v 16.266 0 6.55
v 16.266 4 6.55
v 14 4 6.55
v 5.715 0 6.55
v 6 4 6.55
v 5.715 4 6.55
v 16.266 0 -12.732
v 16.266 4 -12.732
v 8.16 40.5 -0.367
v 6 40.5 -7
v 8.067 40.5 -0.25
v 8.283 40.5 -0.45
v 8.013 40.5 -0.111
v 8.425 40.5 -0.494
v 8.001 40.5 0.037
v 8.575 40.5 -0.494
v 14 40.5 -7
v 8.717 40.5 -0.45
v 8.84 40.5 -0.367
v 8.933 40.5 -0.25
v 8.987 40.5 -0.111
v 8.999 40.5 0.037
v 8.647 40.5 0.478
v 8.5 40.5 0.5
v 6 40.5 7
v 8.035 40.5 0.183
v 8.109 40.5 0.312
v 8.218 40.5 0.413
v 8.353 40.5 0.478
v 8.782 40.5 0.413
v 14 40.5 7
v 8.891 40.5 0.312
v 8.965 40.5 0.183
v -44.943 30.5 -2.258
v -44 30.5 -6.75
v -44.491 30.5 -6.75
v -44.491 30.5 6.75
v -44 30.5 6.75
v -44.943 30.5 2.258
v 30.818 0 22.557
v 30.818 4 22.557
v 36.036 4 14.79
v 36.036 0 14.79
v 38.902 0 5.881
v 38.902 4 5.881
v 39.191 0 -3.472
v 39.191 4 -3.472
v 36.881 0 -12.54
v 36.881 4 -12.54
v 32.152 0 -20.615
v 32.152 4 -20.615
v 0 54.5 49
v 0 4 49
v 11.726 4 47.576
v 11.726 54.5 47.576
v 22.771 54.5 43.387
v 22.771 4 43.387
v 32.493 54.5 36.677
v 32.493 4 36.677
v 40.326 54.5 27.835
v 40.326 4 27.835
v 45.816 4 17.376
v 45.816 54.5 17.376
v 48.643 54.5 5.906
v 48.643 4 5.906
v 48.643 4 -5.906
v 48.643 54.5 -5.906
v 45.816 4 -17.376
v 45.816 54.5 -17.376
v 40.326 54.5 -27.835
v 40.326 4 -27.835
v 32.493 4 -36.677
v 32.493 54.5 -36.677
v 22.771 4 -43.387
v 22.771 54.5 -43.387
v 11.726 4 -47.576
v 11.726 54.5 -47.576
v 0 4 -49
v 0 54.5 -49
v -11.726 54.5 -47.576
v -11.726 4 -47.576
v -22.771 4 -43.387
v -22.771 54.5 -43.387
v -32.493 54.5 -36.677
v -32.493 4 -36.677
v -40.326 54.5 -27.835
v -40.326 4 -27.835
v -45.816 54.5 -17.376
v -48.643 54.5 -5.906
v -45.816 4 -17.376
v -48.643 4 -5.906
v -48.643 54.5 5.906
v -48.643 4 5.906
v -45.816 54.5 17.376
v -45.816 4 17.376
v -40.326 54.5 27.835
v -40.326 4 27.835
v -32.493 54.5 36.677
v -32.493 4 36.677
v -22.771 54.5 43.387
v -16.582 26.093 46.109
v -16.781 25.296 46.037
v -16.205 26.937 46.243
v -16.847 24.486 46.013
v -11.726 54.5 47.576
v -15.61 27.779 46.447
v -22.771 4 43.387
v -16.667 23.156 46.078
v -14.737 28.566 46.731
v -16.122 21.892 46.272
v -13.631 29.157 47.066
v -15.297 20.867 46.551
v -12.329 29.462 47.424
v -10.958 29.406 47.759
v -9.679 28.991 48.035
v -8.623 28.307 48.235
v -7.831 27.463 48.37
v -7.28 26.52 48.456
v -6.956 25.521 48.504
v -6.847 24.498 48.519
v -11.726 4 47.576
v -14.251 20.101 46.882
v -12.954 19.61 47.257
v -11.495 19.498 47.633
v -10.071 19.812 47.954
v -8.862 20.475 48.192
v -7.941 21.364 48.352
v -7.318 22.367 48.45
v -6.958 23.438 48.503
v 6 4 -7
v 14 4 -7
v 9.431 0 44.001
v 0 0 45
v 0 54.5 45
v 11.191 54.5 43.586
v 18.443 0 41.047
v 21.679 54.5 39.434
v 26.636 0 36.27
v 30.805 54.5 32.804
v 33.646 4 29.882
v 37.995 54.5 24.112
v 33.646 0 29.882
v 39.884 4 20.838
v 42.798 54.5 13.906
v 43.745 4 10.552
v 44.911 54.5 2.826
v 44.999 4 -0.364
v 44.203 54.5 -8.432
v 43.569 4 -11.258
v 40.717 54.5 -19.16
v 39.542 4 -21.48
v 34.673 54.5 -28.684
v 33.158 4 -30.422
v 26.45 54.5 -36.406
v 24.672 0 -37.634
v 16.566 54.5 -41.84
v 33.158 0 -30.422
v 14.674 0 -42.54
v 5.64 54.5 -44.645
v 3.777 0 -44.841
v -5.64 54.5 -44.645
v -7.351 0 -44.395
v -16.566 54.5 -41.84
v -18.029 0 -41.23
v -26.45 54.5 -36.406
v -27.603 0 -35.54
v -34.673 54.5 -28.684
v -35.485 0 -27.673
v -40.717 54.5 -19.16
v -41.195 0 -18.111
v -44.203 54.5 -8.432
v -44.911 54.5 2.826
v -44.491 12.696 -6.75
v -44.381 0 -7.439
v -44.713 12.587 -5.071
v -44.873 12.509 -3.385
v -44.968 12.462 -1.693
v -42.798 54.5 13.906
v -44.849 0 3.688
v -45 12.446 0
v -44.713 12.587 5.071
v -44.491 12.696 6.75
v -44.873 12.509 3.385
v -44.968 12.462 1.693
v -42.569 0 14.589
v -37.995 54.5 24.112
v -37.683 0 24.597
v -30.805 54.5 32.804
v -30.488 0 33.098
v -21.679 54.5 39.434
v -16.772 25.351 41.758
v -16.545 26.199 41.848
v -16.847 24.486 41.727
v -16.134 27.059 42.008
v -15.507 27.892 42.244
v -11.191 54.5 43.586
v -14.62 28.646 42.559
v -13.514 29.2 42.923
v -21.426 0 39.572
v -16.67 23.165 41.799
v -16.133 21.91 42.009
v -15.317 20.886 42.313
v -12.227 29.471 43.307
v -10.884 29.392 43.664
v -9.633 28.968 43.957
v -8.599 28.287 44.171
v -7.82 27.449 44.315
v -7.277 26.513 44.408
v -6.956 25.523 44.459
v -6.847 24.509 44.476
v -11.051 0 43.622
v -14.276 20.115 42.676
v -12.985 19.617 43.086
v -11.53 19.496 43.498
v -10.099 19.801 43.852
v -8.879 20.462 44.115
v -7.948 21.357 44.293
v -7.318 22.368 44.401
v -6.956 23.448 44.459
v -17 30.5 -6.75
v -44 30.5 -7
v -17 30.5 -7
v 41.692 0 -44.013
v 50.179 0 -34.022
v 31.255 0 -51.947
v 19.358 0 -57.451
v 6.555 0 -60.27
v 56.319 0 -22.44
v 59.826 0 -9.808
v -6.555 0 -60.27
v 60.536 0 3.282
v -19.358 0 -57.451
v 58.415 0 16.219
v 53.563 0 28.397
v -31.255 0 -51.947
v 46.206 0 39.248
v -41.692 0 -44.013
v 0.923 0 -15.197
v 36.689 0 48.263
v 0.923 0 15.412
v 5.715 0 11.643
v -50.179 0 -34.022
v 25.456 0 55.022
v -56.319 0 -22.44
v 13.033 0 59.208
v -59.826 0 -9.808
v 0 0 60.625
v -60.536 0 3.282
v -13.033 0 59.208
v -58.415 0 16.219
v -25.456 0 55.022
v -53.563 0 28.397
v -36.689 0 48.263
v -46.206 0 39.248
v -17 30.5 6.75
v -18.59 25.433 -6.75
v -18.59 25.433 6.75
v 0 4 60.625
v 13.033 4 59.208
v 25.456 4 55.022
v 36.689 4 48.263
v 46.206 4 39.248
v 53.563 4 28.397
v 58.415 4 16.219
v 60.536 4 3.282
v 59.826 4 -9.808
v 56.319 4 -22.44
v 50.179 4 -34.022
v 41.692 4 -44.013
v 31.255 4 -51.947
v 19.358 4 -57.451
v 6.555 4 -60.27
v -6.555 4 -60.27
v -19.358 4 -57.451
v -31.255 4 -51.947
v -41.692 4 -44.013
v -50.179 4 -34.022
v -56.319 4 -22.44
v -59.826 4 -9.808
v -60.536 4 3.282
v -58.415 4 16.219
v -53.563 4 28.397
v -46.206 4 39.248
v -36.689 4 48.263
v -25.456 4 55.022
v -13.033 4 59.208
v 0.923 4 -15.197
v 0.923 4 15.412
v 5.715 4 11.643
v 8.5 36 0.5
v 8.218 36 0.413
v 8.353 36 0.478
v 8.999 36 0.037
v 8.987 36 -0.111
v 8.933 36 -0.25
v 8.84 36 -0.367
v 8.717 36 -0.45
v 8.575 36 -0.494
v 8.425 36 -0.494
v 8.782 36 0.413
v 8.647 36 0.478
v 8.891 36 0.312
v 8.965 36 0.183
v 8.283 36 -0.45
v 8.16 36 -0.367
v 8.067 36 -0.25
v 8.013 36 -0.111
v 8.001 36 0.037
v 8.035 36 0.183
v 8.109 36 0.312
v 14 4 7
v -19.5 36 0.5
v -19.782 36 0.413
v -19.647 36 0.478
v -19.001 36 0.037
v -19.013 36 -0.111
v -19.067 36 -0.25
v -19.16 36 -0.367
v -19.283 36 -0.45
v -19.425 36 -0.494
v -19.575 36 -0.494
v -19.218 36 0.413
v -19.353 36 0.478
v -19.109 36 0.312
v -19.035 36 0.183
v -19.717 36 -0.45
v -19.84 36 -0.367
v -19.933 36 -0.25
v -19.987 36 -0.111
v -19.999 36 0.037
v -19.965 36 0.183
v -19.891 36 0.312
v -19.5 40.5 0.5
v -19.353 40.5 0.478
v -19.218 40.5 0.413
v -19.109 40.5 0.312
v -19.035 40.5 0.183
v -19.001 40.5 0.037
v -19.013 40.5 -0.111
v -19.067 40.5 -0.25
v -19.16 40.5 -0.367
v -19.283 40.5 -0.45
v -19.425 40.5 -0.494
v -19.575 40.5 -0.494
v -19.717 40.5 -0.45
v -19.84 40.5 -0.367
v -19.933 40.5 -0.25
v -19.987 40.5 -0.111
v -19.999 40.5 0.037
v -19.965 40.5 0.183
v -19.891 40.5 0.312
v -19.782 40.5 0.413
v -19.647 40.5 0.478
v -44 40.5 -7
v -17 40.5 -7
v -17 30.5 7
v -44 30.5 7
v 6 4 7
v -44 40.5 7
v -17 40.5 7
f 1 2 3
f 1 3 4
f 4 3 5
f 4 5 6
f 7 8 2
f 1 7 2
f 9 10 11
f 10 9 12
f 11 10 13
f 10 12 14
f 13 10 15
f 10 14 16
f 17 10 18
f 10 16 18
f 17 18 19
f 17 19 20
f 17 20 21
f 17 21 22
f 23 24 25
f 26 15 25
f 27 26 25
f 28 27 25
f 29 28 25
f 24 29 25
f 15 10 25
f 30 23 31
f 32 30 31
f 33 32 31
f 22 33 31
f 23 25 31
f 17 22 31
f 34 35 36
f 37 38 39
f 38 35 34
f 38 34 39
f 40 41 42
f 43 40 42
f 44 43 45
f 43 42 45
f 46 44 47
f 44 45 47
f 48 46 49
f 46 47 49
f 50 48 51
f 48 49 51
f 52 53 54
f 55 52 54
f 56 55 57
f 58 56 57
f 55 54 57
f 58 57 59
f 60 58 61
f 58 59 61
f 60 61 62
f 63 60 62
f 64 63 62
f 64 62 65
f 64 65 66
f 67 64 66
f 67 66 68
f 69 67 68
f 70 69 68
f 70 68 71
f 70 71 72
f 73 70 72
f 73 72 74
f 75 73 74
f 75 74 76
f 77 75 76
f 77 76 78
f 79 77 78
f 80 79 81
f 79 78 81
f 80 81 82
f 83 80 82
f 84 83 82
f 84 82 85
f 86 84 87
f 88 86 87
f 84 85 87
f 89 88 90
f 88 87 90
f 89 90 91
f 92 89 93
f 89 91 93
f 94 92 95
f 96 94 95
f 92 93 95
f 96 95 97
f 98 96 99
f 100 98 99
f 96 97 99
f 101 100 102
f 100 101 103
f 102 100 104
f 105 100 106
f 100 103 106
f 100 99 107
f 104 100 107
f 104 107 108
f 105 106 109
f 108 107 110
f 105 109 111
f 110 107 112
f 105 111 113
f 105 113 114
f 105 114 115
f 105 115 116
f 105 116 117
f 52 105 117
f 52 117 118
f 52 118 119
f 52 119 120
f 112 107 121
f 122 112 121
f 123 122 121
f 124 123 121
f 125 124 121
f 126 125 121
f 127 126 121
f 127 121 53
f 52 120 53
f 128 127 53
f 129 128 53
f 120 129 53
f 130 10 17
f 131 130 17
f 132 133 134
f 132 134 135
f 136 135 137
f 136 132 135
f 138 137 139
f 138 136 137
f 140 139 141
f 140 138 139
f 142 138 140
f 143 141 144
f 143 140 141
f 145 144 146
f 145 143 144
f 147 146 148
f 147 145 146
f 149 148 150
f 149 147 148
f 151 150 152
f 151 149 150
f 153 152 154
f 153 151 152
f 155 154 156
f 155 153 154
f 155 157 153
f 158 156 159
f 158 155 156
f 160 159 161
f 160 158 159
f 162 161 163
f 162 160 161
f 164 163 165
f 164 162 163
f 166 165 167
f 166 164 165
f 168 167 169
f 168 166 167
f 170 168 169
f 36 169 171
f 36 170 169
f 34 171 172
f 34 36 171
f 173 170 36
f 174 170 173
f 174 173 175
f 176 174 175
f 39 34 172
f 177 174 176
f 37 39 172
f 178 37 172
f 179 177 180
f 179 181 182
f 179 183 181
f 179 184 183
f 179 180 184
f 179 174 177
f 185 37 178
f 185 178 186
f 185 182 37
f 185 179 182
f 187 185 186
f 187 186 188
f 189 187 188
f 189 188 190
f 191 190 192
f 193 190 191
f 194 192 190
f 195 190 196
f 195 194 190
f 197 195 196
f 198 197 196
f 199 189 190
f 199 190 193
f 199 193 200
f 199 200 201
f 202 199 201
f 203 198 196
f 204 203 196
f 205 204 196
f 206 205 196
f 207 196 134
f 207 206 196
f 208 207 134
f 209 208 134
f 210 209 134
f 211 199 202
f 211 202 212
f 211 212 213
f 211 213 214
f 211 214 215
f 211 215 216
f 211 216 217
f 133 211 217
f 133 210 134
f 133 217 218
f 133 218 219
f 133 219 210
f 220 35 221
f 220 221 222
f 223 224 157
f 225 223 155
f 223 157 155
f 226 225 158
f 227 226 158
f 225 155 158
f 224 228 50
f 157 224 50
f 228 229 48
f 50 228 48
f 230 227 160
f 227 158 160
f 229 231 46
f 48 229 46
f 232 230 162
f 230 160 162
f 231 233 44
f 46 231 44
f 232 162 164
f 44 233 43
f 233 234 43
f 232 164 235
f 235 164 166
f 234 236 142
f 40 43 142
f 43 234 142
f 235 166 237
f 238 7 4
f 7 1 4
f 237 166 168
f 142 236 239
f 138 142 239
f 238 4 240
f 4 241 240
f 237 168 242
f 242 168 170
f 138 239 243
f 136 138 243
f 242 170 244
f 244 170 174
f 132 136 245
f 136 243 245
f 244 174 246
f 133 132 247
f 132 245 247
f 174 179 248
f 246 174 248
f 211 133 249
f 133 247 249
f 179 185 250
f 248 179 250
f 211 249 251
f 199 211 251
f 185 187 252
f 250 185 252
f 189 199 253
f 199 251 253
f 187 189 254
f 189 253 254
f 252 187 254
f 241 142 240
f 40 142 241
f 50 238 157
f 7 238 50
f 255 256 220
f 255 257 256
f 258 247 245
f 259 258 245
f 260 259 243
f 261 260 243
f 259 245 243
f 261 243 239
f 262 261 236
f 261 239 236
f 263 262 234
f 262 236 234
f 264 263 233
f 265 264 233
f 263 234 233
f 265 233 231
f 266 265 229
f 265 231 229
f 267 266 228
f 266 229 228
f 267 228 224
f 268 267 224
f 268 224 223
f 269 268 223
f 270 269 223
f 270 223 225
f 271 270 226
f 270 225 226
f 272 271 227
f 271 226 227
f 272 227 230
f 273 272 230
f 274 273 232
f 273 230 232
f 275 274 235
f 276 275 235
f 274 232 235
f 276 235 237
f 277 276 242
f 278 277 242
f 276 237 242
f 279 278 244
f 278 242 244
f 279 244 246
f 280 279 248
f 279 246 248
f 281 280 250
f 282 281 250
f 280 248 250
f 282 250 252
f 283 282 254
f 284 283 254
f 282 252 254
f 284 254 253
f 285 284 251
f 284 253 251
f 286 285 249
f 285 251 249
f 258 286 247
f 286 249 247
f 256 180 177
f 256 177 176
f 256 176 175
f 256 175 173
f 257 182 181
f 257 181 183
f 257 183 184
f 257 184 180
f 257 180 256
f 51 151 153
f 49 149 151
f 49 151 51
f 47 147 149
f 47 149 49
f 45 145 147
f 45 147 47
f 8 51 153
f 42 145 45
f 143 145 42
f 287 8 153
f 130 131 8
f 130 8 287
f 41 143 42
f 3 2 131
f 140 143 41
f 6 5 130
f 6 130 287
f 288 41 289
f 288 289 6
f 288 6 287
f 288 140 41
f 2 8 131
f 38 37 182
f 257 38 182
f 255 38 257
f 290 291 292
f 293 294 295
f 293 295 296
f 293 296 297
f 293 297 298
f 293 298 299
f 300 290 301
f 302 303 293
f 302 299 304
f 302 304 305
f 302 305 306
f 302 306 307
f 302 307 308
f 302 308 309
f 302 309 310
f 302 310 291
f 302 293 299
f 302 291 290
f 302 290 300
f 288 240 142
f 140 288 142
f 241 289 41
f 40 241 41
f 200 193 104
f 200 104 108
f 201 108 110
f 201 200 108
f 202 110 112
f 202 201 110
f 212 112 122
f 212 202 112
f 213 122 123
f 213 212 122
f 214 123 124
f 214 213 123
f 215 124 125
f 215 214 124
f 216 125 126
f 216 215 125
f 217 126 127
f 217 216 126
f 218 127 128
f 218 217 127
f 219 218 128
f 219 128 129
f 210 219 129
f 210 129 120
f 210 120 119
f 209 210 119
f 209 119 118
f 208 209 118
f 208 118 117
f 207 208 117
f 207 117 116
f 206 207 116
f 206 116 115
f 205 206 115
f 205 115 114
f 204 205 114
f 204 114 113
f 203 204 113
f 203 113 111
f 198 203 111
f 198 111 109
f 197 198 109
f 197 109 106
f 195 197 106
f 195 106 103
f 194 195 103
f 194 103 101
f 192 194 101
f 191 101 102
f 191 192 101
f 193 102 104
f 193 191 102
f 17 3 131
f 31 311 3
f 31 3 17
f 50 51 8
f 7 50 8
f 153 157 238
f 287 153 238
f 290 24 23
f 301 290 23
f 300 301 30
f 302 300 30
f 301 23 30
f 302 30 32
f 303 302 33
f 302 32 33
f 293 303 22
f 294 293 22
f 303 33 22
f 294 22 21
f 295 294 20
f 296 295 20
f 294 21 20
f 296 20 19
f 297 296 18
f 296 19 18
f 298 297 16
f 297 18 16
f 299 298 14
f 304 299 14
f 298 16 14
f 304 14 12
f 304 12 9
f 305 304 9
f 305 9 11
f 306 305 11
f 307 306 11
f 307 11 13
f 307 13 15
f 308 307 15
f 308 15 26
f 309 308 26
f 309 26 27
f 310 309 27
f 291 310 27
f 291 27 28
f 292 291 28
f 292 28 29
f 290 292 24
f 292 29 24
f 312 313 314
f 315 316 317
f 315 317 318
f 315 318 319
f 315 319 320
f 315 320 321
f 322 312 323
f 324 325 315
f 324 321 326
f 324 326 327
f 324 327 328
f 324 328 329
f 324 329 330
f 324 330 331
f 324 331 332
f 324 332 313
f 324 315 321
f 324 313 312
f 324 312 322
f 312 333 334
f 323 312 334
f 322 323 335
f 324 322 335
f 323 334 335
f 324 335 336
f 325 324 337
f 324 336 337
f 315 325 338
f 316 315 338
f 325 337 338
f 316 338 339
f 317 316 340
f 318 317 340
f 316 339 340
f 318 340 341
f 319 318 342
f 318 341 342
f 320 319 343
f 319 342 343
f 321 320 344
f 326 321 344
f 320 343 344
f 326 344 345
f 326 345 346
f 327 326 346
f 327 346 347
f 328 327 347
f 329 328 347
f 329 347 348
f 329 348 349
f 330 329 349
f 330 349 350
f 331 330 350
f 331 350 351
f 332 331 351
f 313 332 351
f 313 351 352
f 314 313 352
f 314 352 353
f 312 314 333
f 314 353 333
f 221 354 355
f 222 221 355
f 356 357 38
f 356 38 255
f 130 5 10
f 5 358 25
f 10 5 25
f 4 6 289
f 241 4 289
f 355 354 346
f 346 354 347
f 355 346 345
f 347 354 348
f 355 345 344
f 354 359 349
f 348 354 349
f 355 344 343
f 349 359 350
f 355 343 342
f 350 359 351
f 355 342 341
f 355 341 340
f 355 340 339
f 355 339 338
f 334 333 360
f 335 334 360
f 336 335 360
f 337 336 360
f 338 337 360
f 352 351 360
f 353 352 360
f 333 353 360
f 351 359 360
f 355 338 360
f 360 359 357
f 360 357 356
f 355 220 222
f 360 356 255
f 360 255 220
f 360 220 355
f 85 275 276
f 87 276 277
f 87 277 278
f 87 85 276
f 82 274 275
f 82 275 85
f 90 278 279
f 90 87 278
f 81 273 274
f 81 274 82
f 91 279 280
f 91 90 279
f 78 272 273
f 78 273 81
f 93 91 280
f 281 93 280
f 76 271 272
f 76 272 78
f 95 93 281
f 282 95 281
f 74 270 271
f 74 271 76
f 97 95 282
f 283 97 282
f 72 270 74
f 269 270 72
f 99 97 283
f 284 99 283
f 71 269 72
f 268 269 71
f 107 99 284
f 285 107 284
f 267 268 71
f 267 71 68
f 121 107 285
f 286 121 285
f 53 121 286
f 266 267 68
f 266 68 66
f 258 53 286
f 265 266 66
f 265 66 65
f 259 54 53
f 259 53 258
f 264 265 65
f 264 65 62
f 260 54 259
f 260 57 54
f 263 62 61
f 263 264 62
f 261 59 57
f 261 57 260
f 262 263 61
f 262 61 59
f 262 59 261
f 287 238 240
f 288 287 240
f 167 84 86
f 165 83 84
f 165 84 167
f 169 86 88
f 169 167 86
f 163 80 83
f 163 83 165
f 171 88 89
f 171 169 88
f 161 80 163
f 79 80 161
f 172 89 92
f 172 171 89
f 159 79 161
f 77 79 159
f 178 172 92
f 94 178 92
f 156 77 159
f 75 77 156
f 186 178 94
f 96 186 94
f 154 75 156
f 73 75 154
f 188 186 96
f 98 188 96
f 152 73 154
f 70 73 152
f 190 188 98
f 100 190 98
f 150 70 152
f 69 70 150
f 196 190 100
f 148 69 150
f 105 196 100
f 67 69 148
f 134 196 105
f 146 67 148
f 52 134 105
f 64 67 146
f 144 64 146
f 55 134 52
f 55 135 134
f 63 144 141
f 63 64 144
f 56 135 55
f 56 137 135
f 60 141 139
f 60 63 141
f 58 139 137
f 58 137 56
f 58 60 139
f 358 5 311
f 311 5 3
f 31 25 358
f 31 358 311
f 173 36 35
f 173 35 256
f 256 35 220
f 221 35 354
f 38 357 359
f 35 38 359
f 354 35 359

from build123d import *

# Parameters (mm, degrees)
SKETCH1_R             = 60.625
SKETCH1_R_2           = 45
BOSS_EXTRUDE1_DEPTH   = 4
SKETCH2_R             = 49
SKETCH2_R_2           = 45
BOSS_EXTRUDE2_DEPTH   = 50.5
SKETCH4_W             = 8
SKETCH4_H             = 40.5
BOSS_EXTRUDE4_DEPTH   = 7
SKETCH4_W_2           = 27
SKETCH4_H_2           = 10
BOSS_EXTRUDE4_2_DEPTH = 7
BOSS_EXTRUDE5_DEPTH   = 4
SKETCH6_R             = 5
CUT_EXTRUDE2_DEPTH    = 52
CUT_EXTRUDE6_DEPTH    = 100.503925853
SKETCH15_R            = 0.5
CUT_EXTRUDE7_DEPTH    = 4.5
SKETCH15_3_R          = 0.5
CUT_EXTRUDE8_DEPTH    = 4.5
BOSS_EXTRUDE6_DEPTH   = 6.75


with BuildPart() as part:
    # Sketch1 → Boss-Extrude1 (new body)
    with BuildSketch(Plane(origin=(0, 0, 0), x_dir=(1, 0, 0), z_dir=(0, 1, 0))):
        with Locations(Location((0, 0, 0), (0, 0, 270))):
            Circle(SKETCH1_R)
        with Locations(Location((0, 0, 0), (0, 0, 270))):
            Circle(SKETCH1_R_2, mode=Mode.SUBTRACT)
    extrude(amount=BOSS_EXTRUDE1_DEPTH)

    # Sketch2 → Boss-Extrude2 (add)
    with BuildSketch(Plane(origin=(0, 4, 0), x_dir=(1, 0, 0), z_dir=(0, 1, 0))):
        with Locations(Location((0, 0, 0), (0, 0, 270))):
            Circle(SKETCH2_R)
        with Locations(Location((0, 0, 0), (0, 0, 270))):
            Circle(SKETCH2_R_2, mode=Mode.SUBTRACT)
    extrude(amount=BOSS_EXTRUDE2_DEPTH)



with BuildPart() as body_2:
    # Sketch4 → Boss-Extrude4 (new, symmetric)
    with BuildSketch(Plane.XY):
        with Locations((10, 20.25)):
            Rectangle(SKETCH4_W, SKETCH4_H)
    extrude(amount=BOSS_EXTRUDE4_DEPTH, both=True)


with BuildPart() as body_3:
    # Sketch4 → Boss-Extrude4 2 (new, symmetric)
    with BuildSketch(Plane.XY):
        with Locations((-30.5, 35.5)):
            Rectangle(SKETCH4_W_2, SKETCH4_H_2)
    extrude(amount=BOSS_EXTRUDE4_2_DEPTH, both=True)

    # Sketch15<3> → Cut-Extrude8 (cut)
    with BuildSketch(Plane(origin=(0, 40.5, 0), x_dir=(1, 0, 0), z_dir=(0, 1, 0))):
        with Locations(Location((-19.5, 0, 0), (0, 0, 270))):
            Circle(SKETCH15_3_R)
        with Locations(Location((8.5, 0, 0), (0, 0, 270))):
            Circle(SKETCH15_3_R)
    extrude(amount=-CUT_EXTRUDE8_DEPTH, mode=Mode.SUBTRACT)


with BuildPart() as part_1:
    add(part.part)

    add(body_2.part)  # Boss-Extrude5 merges body 2
    # Sketch5 → Boss-Extrude5 (add)
    with BuildSketch(Plane(origin=(0, 0, 0.832419338), x_dir=(1, 0, 0), z_dir=(0, -1, 0))):
        with BuildLine():
            Line((0.92268666, 14.579552818), (36.10584122, 30.137929754))
            ThreePointArc((36.10584122, 30.137929754), (47.46850162, -1.287411864), (36.651216878, -32.904630242))
            Line((36.651216878, -32.904630242), (0.92268666, -16.029114558))
            Line((0.92268666, -16.029114558), (0.92268666, 14.579552818))
        make_face()
    extrude(amount=-BOSS_EXTRUDE5_DEPTH)

    # Sketch6 → Cut-Extrude2 (cut)
    with BuildSketch(Plane.XY):
        with Locations(Location((-11.847358964, 24.485616242, 0), (0, 0, 180))):
            Circle(SKETCH6_R)
    extrude(amount=CUT_EXTRUDE2_DEPTH, mode=Mode.SUBTRACT)

    # Sketch11 → Cut-Extrude6 (cut, through all)
    with BuildSketch(Plane(origin=(0, 4, 0), x_dir=(1, 0, 0), z_dir=(0, 1, 0))):
        with BuildLine():
            Line((16.265526008, 12.732401326), (16.265526008, -6.549664017))
            Line((16.265526008, -6.549664017), (5.714961953, -6.549664017))
            Line((5.714961953, -6.549664017), (5.714961953, -11.643039768))
            Line((5.714961953, -11.643039768), (30.818028154, -22.557416377))
            ThreePointArc((30.818028154, -22.557416377), (39.374347706, -1.214976289), (32.152007517, 20.615006655))
            Line((32.152007517, 20.615006655), (16.265526008, 12.732401326))
        make_face()
    extrude(amount=-CUT_EXTRUDE6_DEPTH, mode=Mode.SUBTRACT)

    # Sketch15 → Cut-Extrude7 (cut)
    with BuildSketch(Plane(origin=(0, 40.5, 0), x_dir=(1, 0, 0), z_dir=(0, 1, 0))):
        with Locations((-19.5, 0)):
            Circle(SKETCH15_R)
        with Locations(Location((8.5, 0, 0), (0, 0, 270))):
            Circle(SKETCH15_R)
    extrude(amount=-CUT_EXTRUDE7_DEPTH, mode=Mode.SUBTRACT)


    add(body_3.part)  # Boss-Extrude6 merges body 3
    # Sketch17 → Boss-Extrude6 (add, symmetric)
    with BuildSketch(Plane.XY):
        Polygon((-17, 30.5), (-45, 30.5), (-45, 12.445827276), (-18.590132897, 25.433454532), align=None)
    extrude(amount=BOSS_EXTRUDE6_DEPTH, both=True)


solid = part_1.part
